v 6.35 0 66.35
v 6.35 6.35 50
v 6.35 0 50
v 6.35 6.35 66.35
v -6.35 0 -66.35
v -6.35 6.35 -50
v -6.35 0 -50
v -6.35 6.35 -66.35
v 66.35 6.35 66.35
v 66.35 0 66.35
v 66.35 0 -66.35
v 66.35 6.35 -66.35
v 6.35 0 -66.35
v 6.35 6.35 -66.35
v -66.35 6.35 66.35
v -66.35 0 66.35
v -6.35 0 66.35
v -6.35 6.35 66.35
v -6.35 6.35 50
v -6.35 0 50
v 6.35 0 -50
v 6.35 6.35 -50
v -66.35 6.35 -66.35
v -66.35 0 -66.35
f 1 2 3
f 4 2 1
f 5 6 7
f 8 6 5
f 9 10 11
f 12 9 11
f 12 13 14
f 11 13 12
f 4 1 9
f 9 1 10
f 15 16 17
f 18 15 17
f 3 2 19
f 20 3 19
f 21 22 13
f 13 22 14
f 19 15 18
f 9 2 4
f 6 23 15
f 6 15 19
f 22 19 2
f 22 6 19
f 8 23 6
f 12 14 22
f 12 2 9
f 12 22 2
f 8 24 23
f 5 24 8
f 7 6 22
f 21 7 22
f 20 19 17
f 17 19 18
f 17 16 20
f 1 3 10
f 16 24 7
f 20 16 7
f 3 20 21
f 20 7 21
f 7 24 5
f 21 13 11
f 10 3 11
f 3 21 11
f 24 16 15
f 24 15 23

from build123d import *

# Parameters (mm, degrees)
SKETCH1_W           = 132.7
SKETCH1_H           = 132.7
BOSS_EXTRUDE2_DEPTH = 6.35
SKETCH5_W           = 12.7
SKETCH5_H           = 16.35
CUT_EXTRUDE1_DEPTH  = 95.047687372
CIRPATTERN1_COUNT   = 2


with BuildPart() as part:
    # Sketch1 → Boss-Extrude2 (new body)
    with BuildSketch(Plane(origin=(0, 0, 0), x_dir=(1, 0, 0), z_dir=(0, 1, 0))):
        Rectangle(SKETCH1_W, SKETCH1_H)
    extrude(amount=BOSS_EXTRUDE2_DEPTH)

    # Sketch5 → Cut-Extrude1 (cut, through all)
    with BuildSketch(Plane(origin=(0, 6.35, 0), x_dir=(1, 0, 0), z_dir=(0, 1, 0))):
        with Locations((0, 58.175)):
            Rectangle(SKETCH5_W, SKETCH5_H)
    cut_extrude1 = extrude(amount=-CUT_EXTRUDE1_DEPTH, mode=Mode.SUBTRACT)

    # CirPattern1: Cut-Extrude1 ×2 about axis
    cirpattern1_axis = Axis((0, 6.35, 0), (0, 1, 0))
    for i in range(1, CIRPATTERN1_COUNT):
        add(cut_extrude1.rotate(cirpattern1_axis, i * 360 / CIRPATTERN1_COUNT), mode=Mode.SUBTRACT)


solid = part.part
